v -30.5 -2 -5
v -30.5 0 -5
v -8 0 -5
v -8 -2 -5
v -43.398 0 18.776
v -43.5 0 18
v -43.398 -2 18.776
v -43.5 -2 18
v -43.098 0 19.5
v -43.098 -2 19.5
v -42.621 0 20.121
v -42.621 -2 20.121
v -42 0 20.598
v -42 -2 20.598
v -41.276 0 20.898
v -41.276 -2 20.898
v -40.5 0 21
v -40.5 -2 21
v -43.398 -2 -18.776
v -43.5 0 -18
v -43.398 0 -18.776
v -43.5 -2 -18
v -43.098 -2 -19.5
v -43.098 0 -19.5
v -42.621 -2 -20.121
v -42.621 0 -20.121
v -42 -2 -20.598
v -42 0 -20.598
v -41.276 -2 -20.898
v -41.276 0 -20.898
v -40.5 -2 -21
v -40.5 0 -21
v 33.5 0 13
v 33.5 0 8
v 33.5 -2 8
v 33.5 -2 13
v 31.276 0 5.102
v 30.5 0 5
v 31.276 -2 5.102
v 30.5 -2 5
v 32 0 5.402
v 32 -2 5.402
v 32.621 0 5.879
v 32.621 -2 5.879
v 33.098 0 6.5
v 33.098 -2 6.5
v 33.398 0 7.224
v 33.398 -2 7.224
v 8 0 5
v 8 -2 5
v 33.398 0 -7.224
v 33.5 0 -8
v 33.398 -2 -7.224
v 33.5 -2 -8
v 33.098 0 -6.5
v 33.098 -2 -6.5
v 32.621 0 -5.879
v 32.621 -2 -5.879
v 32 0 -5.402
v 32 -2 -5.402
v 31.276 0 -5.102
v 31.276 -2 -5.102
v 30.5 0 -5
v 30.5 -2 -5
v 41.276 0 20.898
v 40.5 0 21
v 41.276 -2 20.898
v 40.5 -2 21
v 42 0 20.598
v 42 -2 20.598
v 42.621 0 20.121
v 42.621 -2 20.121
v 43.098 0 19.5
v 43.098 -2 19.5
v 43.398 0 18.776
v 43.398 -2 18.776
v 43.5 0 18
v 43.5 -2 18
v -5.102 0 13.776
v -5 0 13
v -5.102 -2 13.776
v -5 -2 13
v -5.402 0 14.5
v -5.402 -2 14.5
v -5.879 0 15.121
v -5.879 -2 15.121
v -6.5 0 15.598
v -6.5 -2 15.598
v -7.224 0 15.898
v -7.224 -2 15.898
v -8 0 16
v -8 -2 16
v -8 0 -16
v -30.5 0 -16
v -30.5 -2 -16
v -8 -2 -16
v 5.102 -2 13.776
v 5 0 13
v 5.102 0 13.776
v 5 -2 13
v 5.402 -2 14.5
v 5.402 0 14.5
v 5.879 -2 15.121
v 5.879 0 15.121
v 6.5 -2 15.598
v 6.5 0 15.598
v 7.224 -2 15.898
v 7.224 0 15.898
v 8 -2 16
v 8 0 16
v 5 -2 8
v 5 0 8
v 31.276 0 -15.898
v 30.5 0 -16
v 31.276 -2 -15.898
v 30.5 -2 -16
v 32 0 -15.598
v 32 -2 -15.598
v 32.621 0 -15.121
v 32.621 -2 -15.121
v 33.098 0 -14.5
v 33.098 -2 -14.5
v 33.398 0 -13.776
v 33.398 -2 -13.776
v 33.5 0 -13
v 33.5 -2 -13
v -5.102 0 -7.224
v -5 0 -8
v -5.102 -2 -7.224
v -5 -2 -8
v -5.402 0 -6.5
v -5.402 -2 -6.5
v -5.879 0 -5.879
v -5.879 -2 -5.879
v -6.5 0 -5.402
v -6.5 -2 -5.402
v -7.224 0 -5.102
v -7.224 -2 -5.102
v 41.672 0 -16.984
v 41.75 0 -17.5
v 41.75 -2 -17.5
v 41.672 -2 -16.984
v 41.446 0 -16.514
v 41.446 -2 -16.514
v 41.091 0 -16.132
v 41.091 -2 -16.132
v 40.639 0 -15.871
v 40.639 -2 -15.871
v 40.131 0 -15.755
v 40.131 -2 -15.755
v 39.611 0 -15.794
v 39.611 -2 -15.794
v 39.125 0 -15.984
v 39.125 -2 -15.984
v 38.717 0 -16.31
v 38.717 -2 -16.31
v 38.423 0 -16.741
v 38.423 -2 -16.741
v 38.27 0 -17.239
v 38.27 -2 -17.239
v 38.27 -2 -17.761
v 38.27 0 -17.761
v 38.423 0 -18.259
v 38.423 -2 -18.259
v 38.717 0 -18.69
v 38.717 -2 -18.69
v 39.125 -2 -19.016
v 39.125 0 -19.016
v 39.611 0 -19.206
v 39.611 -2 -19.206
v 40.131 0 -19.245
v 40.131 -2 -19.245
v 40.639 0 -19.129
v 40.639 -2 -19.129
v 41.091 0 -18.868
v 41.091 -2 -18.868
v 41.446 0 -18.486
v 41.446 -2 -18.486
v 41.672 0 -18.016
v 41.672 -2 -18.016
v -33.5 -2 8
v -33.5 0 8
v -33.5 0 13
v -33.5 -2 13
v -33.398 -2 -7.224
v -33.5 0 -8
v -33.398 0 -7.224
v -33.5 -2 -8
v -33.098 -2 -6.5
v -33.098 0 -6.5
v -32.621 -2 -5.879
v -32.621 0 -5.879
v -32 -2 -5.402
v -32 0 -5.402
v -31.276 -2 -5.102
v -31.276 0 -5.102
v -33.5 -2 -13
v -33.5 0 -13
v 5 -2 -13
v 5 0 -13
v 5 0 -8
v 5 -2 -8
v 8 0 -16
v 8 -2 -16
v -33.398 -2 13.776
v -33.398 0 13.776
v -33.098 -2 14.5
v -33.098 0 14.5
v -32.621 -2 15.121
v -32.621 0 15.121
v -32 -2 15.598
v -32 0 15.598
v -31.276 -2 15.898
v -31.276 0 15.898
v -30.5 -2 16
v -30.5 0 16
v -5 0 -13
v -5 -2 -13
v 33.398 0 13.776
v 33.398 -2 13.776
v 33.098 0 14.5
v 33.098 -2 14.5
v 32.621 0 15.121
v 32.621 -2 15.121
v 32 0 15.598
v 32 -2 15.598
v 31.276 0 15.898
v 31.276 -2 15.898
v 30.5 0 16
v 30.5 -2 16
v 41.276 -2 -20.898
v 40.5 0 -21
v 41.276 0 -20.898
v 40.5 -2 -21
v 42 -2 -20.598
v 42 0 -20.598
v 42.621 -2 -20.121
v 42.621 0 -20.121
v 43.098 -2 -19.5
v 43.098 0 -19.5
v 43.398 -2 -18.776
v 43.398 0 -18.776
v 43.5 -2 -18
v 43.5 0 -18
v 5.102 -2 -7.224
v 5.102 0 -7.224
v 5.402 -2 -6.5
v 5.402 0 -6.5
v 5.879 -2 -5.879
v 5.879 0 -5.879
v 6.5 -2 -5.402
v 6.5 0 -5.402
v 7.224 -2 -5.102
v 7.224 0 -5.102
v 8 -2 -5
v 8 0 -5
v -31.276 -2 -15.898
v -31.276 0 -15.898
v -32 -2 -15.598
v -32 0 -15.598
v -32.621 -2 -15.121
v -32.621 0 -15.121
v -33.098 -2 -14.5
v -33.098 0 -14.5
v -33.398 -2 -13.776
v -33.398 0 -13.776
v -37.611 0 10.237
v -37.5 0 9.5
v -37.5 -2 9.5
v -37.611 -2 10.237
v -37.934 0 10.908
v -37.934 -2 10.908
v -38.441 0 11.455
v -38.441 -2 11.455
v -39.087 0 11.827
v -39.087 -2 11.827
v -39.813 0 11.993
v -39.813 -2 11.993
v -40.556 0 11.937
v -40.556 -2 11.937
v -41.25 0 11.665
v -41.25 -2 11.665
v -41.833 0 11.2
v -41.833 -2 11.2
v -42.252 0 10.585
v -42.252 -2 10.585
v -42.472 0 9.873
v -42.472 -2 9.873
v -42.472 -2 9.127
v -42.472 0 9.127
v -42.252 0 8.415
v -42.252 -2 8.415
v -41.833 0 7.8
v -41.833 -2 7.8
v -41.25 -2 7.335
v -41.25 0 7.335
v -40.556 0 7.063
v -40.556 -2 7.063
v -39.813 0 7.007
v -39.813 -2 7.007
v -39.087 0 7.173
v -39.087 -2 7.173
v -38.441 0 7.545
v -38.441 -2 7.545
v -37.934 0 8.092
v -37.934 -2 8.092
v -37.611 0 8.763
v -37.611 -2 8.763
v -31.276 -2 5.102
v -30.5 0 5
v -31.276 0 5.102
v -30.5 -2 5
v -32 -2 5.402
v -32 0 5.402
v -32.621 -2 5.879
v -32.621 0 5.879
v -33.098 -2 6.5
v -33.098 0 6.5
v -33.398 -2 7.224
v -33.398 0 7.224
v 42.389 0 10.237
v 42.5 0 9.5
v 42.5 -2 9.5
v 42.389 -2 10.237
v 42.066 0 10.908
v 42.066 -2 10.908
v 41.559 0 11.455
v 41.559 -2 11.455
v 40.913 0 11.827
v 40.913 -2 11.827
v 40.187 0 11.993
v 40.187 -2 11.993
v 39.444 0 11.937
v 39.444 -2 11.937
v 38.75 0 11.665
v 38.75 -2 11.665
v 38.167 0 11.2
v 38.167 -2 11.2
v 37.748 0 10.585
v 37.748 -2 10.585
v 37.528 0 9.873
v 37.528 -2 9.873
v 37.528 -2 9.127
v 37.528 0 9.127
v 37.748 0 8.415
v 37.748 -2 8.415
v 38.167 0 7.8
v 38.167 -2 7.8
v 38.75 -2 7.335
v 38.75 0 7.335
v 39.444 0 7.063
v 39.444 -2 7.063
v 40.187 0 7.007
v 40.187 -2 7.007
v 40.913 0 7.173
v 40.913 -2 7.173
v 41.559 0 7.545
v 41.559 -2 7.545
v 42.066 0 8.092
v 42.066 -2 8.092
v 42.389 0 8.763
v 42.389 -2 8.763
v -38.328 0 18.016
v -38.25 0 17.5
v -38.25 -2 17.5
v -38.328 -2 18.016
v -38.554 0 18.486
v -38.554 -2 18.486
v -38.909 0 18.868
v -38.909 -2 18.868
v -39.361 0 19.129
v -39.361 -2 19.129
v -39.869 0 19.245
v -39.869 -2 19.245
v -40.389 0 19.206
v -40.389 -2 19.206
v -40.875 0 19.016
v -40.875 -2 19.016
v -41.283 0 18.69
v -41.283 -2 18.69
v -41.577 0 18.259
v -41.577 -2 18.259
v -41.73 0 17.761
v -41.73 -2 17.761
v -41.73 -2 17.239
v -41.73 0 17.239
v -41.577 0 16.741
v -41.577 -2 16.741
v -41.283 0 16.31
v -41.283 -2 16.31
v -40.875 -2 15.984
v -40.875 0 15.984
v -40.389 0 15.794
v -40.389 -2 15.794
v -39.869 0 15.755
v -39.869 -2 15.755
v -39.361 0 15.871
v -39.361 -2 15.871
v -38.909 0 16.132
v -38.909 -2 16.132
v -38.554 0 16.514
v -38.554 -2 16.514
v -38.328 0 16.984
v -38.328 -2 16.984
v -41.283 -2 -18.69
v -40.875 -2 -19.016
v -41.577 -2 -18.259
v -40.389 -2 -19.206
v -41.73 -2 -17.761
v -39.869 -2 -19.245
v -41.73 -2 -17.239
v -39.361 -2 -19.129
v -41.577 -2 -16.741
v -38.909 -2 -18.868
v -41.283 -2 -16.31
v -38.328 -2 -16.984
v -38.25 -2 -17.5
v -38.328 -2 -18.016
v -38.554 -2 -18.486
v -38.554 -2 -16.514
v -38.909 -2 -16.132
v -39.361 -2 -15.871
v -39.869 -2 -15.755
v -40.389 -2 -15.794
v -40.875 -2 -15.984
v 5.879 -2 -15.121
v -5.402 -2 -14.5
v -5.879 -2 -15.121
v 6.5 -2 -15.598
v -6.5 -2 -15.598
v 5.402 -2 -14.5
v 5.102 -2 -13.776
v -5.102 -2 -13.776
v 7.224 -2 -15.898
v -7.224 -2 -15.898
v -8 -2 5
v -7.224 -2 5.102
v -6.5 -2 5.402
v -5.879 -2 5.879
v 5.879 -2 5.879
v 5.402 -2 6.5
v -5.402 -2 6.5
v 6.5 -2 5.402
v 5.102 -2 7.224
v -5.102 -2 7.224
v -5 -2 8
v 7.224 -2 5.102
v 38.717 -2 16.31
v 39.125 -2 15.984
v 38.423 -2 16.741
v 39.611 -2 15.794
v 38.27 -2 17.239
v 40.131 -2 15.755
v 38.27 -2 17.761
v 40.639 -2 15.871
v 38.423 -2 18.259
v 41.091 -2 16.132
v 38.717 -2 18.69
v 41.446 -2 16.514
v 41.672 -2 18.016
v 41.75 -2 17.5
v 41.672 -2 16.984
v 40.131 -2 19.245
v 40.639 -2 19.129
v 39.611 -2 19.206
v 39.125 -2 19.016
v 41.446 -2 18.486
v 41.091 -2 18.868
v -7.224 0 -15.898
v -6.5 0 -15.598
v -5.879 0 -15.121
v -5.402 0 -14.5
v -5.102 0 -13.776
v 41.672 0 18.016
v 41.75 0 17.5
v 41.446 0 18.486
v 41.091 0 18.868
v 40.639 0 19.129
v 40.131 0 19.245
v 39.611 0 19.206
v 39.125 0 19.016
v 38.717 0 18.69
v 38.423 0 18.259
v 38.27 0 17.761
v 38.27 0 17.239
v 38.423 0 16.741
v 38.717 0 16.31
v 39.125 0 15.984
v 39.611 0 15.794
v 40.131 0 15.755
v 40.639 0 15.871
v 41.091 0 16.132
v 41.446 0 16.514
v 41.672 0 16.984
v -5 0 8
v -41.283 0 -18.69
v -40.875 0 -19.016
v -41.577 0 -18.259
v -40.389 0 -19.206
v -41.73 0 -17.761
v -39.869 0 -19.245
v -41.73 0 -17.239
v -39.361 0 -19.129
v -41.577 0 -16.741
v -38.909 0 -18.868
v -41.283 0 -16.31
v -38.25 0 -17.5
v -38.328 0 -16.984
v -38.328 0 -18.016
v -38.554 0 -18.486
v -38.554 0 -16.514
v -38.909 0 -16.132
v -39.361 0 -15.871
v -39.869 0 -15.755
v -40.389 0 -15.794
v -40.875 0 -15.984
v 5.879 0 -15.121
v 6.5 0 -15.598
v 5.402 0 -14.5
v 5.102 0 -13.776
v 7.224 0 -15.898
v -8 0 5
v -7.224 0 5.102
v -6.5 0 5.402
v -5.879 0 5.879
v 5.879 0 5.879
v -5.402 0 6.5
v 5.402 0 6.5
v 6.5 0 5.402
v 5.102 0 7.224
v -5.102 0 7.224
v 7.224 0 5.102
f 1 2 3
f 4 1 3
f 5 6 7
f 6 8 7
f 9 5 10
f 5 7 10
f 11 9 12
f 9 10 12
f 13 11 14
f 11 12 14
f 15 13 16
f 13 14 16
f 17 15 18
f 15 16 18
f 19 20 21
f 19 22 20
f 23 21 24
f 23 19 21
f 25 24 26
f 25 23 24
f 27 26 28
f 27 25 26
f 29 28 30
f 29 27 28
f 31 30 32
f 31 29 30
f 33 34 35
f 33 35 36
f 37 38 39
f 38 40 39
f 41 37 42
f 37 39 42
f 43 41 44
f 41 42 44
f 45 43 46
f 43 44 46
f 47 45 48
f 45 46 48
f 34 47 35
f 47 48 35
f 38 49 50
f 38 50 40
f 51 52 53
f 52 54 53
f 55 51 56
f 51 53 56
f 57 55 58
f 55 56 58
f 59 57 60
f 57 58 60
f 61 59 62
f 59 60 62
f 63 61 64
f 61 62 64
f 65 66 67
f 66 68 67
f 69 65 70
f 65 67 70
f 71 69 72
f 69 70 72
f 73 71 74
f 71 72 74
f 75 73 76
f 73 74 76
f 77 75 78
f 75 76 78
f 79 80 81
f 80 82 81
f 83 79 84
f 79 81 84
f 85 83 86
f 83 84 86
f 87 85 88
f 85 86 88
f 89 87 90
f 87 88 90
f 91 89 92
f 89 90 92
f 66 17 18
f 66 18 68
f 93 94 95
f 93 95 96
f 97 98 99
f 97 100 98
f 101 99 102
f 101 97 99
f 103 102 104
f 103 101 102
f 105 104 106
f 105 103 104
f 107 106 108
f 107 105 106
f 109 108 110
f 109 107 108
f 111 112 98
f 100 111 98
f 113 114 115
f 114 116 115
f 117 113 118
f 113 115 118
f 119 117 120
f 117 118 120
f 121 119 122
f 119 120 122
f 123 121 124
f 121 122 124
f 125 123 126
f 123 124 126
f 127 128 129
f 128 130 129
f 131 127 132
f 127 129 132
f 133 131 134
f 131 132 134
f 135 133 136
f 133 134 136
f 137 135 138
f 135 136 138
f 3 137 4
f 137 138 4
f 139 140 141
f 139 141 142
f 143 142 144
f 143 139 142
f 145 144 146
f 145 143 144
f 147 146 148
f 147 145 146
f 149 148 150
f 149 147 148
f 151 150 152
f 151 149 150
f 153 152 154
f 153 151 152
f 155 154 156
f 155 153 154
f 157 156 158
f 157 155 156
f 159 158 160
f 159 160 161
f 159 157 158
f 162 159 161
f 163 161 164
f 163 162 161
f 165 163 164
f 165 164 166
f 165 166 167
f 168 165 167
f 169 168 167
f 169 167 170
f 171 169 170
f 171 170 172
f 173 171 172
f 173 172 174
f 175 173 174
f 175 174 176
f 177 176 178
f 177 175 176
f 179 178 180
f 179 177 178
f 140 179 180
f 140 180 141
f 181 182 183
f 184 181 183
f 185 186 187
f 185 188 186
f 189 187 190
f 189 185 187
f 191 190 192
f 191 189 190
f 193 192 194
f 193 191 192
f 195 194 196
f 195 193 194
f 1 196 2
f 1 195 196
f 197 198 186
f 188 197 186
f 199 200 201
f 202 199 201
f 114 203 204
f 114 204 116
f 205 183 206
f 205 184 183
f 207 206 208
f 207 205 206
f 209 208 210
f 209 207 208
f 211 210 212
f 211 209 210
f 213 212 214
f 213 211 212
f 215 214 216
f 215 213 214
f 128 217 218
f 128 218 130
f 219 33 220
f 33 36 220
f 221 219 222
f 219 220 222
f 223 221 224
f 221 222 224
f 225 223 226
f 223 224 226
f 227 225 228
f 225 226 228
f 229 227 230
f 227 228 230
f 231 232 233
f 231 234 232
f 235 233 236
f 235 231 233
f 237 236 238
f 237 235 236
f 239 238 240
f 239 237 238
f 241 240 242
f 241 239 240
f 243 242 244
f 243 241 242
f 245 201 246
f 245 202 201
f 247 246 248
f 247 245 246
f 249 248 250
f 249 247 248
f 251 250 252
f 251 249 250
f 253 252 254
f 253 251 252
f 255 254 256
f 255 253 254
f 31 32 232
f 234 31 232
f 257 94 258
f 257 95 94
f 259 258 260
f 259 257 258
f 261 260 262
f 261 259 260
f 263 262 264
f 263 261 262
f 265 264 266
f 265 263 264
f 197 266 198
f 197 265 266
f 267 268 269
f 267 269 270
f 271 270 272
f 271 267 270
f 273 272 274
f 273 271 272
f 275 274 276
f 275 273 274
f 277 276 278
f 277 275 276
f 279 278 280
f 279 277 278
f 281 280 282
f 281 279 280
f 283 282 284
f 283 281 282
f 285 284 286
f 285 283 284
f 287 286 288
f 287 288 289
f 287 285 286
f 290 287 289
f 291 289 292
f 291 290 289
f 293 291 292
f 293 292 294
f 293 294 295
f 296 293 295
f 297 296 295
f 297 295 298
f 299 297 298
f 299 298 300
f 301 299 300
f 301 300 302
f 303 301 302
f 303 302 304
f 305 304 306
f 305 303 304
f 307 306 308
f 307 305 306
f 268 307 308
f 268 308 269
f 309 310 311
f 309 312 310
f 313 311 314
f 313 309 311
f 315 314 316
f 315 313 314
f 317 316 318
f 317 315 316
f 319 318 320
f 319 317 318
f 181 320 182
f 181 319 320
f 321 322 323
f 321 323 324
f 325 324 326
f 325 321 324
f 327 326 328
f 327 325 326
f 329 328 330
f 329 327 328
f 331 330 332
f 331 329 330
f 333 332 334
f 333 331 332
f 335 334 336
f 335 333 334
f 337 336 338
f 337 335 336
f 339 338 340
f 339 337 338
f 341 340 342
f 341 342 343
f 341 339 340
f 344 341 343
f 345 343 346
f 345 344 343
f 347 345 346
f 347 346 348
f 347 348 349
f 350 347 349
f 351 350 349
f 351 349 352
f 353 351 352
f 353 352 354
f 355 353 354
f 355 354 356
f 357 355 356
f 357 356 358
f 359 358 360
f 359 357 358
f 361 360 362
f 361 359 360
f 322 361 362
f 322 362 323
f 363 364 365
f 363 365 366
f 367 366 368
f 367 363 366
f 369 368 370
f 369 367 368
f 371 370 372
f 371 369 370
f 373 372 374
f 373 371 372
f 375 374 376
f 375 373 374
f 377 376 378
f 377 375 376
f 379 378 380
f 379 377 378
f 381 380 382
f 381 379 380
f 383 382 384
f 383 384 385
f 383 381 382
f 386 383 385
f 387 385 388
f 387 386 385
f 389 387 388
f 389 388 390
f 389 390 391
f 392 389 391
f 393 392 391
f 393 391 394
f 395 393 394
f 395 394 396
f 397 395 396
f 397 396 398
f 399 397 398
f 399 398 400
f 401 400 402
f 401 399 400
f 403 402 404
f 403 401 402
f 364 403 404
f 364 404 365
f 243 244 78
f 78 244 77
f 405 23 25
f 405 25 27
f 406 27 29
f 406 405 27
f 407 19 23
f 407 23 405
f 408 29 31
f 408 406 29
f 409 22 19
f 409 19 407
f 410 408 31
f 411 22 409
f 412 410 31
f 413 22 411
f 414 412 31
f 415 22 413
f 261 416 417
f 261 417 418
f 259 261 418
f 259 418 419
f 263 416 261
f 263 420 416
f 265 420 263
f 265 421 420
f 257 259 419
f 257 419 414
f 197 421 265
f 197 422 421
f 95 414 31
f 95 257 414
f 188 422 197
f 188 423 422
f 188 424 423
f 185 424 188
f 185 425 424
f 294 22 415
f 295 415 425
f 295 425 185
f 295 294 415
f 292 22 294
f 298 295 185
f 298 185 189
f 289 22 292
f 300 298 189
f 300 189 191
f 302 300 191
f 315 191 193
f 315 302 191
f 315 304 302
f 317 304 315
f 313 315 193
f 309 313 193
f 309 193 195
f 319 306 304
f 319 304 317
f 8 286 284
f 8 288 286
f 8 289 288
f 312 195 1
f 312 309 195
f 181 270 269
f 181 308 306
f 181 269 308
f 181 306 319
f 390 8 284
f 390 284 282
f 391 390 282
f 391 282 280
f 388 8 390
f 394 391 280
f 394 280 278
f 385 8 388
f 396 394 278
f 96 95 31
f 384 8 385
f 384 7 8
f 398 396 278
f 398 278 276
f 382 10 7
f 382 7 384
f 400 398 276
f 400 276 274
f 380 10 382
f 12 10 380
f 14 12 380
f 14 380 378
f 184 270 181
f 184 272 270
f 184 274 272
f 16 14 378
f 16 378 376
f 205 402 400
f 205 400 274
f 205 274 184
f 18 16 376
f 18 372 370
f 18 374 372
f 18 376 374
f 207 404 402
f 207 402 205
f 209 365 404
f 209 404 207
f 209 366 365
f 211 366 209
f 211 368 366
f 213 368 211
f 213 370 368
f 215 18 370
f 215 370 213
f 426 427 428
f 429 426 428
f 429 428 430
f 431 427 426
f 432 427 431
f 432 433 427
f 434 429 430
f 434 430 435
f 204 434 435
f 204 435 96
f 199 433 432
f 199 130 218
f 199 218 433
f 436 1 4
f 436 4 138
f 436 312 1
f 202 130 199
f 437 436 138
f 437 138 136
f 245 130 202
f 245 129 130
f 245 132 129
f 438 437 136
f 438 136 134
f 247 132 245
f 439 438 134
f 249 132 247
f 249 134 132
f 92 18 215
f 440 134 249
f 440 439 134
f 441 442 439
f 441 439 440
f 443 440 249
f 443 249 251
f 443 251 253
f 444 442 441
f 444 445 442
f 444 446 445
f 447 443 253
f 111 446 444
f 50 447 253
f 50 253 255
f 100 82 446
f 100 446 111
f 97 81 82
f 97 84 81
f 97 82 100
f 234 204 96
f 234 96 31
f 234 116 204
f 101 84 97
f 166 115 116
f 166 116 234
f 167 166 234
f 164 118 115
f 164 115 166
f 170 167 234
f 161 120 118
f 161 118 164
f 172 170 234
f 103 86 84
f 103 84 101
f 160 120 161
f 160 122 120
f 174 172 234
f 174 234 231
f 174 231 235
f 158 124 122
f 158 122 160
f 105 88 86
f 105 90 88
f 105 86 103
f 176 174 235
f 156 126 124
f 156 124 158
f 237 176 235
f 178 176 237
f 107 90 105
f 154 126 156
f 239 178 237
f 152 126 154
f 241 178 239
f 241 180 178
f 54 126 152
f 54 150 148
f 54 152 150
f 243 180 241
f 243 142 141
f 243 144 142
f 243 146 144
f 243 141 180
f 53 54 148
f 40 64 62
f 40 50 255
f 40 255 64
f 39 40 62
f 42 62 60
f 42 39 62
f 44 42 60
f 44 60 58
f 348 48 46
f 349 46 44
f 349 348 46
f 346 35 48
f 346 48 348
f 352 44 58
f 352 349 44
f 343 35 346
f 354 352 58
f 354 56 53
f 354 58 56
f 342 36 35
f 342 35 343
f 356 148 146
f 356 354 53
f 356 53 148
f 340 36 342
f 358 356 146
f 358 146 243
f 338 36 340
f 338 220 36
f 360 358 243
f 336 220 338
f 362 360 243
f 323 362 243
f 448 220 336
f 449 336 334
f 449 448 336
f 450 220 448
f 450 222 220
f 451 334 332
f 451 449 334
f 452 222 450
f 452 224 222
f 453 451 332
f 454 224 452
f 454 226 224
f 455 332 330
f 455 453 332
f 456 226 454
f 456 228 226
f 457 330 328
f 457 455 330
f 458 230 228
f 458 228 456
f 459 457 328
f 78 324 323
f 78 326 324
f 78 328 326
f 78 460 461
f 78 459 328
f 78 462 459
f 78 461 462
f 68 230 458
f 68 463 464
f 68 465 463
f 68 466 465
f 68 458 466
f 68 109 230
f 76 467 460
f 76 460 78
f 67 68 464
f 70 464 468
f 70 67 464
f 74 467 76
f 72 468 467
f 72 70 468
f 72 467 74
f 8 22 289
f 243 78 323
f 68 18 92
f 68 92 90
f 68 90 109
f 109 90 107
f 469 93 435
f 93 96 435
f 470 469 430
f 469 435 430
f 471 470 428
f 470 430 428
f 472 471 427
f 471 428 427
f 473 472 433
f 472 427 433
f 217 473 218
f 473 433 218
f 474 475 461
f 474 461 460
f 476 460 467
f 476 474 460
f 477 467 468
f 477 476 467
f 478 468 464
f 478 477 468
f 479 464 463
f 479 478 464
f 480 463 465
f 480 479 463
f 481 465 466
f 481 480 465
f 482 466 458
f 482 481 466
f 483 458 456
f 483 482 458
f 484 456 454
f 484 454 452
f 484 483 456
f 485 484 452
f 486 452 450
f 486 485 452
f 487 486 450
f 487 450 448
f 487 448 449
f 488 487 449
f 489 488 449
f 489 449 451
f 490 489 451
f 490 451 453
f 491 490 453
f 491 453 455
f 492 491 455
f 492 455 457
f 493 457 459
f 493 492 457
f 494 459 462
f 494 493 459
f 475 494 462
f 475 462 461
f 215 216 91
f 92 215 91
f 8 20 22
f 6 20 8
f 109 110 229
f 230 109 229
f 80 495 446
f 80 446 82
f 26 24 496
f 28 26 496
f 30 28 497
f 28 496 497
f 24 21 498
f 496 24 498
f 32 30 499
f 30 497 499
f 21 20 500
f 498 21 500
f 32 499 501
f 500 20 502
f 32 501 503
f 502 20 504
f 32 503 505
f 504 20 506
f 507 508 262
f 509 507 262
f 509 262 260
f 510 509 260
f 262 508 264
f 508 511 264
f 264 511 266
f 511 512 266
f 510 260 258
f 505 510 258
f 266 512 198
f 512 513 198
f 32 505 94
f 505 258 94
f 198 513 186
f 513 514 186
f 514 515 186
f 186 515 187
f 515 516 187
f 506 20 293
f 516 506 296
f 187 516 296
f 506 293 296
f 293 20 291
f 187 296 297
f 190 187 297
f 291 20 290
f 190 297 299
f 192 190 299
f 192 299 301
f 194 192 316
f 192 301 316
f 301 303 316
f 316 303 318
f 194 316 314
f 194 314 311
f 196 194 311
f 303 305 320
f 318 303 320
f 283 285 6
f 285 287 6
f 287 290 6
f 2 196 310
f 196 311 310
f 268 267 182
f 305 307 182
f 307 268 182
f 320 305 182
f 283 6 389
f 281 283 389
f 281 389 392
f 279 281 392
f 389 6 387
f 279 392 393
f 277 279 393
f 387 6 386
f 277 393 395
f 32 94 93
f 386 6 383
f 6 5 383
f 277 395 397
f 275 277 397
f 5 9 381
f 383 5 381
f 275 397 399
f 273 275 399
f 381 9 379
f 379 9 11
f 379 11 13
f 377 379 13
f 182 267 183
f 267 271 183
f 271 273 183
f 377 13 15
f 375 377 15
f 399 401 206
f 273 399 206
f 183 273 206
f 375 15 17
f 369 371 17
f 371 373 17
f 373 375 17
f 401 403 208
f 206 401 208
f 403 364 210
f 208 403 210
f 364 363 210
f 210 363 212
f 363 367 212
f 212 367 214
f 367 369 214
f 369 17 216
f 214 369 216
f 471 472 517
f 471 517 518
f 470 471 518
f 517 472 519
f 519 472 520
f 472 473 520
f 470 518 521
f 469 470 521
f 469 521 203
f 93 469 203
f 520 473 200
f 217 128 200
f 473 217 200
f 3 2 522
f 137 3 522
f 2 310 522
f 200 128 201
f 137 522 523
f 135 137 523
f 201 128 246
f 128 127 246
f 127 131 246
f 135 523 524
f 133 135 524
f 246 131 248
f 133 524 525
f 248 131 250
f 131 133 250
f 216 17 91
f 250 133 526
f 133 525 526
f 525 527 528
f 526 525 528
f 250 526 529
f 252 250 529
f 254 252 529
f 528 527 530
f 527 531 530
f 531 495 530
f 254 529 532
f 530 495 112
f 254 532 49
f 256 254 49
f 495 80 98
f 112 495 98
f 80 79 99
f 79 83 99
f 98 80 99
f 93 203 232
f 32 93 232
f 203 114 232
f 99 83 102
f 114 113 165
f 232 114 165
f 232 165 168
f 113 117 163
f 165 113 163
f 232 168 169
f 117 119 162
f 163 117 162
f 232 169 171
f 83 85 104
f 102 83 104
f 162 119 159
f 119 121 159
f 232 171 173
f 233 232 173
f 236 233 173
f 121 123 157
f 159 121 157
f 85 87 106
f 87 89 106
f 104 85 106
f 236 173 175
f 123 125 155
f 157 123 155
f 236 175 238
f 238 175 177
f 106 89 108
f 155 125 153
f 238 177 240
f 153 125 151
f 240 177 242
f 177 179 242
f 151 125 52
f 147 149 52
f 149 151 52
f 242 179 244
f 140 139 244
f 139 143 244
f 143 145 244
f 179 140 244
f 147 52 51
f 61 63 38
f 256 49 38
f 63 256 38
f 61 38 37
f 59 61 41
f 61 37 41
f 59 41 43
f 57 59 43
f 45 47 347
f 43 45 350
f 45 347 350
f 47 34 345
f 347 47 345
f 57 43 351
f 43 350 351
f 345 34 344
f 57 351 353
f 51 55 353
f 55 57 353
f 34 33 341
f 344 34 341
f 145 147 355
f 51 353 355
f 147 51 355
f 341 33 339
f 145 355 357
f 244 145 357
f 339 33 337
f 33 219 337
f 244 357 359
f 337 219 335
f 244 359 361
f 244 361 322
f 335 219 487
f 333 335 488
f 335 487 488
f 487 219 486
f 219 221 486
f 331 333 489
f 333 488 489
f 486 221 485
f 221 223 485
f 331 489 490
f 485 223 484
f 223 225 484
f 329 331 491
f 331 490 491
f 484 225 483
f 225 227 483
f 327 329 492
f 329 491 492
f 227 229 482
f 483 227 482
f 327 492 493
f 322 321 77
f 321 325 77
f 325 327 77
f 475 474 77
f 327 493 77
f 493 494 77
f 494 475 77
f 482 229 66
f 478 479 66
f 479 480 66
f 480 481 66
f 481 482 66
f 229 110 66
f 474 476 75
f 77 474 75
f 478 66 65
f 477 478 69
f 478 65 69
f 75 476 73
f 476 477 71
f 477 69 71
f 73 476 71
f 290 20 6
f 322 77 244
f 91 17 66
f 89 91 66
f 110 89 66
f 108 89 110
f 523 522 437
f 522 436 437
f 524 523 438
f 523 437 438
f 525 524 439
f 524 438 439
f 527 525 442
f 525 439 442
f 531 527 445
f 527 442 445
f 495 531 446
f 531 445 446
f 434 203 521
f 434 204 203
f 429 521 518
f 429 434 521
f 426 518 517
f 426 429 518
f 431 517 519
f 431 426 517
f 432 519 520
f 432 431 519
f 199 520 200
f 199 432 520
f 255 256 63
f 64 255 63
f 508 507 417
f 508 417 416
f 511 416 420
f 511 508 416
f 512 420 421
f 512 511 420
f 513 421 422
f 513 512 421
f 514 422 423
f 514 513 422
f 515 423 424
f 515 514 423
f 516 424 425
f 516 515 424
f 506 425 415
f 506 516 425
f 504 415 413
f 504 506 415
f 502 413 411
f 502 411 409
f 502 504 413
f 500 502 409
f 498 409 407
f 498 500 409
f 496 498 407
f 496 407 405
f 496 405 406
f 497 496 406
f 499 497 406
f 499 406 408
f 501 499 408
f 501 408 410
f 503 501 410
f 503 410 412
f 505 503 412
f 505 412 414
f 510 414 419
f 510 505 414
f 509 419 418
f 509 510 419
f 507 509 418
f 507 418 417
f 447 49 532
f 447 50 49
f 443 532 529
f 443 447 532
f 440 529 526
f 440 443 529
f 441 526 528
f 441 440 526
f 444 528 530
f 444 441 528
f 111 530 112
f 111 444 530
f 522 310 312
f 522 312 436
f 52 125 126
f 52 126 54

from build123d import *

# Parameters (mm, degrees)
F0_W     = 87
F0_H     = 42
F0_R     = 1.75
F0_W_2   = 28.5
F0_H_2   = 11
F0_R_2   = 2.5
F1_DEPTH = 2
F2_R     = 3


with BuildPart() as f1:
    # F0 (on Front) → F1 (new body)
    with BuildSketch(Plane.XZ):
        Rectangle(F0_W, F0_H)
        with Locations((-40, -17.5)):
            Circle(F0_R, mode=Mode.SUBTRACT)
        with Locations((-19.25, -10.5)):
            Rectangle(F0_W_2, F0_H_2, mode=Mode.SUBTRACT)
        with Locations((40, -17.5)):
            Circle(F0_R, mode=Mode.SUBTRACT)
        with Locations((19.25, -10.5)):
            Rectangle(F0_W_2, F0_H_2, mode=Mode.SUBTRACT)
        with Locations((-40, 9.5)):
            Circle(F0_R_2, mode=Mode.SUBTRACT)
        with Locations((-40, 17.5)):
            Circle(F0_R, mode=Mode.SUBTRACT)
        with Locations((-19.25, 10.5)):
            Rectangle(F0_W_2, F0_H_2, mode=Mode.SUBTRACT)
        with Locations((40, 9.5)):
            Circle(F0_R_2, mode=Mode.SUBTRACT)
        with Locations((19.25, 10.5)):
            Rectangle(F0_W_2, F0_H_2, mode=Mode.SUBTRACT)
        with Locations((40, 17.5)):
            Circle(F0_R, mode=Mode.SUBTRACT)
    extrude(amount=F1_DEPTH)

    # F2
    f2_edges = [f1.edges().sort_by_distance(p)[0] for p in [
        (-43.5, -1, 21),
        (-43.5, -1, -21),
        (43.5, -1, -21),
        (43.5, -1, 21),
        (-5, -1, 16),
        (33.5, -1, 16),
        (-33.5, -1, 16),
        (-33.5, -1, -5),
        (5, -1, -5),
        (5, -1, 16),
        (-33.5, -1, -16),
        (-33.5, -1, 5),
        (5, -1, 5),
        (5, -1, -16),
        (33.5, -1, 5),
        (33.5, -1, -16),
        (-5, -1, 5),
        (-5, -1, -5),
        (-5, -1, -16),
        (33.5, -1, -5),
    ]]
    fillet(f2_edges, radius=F2_R)


solid = f1.part
